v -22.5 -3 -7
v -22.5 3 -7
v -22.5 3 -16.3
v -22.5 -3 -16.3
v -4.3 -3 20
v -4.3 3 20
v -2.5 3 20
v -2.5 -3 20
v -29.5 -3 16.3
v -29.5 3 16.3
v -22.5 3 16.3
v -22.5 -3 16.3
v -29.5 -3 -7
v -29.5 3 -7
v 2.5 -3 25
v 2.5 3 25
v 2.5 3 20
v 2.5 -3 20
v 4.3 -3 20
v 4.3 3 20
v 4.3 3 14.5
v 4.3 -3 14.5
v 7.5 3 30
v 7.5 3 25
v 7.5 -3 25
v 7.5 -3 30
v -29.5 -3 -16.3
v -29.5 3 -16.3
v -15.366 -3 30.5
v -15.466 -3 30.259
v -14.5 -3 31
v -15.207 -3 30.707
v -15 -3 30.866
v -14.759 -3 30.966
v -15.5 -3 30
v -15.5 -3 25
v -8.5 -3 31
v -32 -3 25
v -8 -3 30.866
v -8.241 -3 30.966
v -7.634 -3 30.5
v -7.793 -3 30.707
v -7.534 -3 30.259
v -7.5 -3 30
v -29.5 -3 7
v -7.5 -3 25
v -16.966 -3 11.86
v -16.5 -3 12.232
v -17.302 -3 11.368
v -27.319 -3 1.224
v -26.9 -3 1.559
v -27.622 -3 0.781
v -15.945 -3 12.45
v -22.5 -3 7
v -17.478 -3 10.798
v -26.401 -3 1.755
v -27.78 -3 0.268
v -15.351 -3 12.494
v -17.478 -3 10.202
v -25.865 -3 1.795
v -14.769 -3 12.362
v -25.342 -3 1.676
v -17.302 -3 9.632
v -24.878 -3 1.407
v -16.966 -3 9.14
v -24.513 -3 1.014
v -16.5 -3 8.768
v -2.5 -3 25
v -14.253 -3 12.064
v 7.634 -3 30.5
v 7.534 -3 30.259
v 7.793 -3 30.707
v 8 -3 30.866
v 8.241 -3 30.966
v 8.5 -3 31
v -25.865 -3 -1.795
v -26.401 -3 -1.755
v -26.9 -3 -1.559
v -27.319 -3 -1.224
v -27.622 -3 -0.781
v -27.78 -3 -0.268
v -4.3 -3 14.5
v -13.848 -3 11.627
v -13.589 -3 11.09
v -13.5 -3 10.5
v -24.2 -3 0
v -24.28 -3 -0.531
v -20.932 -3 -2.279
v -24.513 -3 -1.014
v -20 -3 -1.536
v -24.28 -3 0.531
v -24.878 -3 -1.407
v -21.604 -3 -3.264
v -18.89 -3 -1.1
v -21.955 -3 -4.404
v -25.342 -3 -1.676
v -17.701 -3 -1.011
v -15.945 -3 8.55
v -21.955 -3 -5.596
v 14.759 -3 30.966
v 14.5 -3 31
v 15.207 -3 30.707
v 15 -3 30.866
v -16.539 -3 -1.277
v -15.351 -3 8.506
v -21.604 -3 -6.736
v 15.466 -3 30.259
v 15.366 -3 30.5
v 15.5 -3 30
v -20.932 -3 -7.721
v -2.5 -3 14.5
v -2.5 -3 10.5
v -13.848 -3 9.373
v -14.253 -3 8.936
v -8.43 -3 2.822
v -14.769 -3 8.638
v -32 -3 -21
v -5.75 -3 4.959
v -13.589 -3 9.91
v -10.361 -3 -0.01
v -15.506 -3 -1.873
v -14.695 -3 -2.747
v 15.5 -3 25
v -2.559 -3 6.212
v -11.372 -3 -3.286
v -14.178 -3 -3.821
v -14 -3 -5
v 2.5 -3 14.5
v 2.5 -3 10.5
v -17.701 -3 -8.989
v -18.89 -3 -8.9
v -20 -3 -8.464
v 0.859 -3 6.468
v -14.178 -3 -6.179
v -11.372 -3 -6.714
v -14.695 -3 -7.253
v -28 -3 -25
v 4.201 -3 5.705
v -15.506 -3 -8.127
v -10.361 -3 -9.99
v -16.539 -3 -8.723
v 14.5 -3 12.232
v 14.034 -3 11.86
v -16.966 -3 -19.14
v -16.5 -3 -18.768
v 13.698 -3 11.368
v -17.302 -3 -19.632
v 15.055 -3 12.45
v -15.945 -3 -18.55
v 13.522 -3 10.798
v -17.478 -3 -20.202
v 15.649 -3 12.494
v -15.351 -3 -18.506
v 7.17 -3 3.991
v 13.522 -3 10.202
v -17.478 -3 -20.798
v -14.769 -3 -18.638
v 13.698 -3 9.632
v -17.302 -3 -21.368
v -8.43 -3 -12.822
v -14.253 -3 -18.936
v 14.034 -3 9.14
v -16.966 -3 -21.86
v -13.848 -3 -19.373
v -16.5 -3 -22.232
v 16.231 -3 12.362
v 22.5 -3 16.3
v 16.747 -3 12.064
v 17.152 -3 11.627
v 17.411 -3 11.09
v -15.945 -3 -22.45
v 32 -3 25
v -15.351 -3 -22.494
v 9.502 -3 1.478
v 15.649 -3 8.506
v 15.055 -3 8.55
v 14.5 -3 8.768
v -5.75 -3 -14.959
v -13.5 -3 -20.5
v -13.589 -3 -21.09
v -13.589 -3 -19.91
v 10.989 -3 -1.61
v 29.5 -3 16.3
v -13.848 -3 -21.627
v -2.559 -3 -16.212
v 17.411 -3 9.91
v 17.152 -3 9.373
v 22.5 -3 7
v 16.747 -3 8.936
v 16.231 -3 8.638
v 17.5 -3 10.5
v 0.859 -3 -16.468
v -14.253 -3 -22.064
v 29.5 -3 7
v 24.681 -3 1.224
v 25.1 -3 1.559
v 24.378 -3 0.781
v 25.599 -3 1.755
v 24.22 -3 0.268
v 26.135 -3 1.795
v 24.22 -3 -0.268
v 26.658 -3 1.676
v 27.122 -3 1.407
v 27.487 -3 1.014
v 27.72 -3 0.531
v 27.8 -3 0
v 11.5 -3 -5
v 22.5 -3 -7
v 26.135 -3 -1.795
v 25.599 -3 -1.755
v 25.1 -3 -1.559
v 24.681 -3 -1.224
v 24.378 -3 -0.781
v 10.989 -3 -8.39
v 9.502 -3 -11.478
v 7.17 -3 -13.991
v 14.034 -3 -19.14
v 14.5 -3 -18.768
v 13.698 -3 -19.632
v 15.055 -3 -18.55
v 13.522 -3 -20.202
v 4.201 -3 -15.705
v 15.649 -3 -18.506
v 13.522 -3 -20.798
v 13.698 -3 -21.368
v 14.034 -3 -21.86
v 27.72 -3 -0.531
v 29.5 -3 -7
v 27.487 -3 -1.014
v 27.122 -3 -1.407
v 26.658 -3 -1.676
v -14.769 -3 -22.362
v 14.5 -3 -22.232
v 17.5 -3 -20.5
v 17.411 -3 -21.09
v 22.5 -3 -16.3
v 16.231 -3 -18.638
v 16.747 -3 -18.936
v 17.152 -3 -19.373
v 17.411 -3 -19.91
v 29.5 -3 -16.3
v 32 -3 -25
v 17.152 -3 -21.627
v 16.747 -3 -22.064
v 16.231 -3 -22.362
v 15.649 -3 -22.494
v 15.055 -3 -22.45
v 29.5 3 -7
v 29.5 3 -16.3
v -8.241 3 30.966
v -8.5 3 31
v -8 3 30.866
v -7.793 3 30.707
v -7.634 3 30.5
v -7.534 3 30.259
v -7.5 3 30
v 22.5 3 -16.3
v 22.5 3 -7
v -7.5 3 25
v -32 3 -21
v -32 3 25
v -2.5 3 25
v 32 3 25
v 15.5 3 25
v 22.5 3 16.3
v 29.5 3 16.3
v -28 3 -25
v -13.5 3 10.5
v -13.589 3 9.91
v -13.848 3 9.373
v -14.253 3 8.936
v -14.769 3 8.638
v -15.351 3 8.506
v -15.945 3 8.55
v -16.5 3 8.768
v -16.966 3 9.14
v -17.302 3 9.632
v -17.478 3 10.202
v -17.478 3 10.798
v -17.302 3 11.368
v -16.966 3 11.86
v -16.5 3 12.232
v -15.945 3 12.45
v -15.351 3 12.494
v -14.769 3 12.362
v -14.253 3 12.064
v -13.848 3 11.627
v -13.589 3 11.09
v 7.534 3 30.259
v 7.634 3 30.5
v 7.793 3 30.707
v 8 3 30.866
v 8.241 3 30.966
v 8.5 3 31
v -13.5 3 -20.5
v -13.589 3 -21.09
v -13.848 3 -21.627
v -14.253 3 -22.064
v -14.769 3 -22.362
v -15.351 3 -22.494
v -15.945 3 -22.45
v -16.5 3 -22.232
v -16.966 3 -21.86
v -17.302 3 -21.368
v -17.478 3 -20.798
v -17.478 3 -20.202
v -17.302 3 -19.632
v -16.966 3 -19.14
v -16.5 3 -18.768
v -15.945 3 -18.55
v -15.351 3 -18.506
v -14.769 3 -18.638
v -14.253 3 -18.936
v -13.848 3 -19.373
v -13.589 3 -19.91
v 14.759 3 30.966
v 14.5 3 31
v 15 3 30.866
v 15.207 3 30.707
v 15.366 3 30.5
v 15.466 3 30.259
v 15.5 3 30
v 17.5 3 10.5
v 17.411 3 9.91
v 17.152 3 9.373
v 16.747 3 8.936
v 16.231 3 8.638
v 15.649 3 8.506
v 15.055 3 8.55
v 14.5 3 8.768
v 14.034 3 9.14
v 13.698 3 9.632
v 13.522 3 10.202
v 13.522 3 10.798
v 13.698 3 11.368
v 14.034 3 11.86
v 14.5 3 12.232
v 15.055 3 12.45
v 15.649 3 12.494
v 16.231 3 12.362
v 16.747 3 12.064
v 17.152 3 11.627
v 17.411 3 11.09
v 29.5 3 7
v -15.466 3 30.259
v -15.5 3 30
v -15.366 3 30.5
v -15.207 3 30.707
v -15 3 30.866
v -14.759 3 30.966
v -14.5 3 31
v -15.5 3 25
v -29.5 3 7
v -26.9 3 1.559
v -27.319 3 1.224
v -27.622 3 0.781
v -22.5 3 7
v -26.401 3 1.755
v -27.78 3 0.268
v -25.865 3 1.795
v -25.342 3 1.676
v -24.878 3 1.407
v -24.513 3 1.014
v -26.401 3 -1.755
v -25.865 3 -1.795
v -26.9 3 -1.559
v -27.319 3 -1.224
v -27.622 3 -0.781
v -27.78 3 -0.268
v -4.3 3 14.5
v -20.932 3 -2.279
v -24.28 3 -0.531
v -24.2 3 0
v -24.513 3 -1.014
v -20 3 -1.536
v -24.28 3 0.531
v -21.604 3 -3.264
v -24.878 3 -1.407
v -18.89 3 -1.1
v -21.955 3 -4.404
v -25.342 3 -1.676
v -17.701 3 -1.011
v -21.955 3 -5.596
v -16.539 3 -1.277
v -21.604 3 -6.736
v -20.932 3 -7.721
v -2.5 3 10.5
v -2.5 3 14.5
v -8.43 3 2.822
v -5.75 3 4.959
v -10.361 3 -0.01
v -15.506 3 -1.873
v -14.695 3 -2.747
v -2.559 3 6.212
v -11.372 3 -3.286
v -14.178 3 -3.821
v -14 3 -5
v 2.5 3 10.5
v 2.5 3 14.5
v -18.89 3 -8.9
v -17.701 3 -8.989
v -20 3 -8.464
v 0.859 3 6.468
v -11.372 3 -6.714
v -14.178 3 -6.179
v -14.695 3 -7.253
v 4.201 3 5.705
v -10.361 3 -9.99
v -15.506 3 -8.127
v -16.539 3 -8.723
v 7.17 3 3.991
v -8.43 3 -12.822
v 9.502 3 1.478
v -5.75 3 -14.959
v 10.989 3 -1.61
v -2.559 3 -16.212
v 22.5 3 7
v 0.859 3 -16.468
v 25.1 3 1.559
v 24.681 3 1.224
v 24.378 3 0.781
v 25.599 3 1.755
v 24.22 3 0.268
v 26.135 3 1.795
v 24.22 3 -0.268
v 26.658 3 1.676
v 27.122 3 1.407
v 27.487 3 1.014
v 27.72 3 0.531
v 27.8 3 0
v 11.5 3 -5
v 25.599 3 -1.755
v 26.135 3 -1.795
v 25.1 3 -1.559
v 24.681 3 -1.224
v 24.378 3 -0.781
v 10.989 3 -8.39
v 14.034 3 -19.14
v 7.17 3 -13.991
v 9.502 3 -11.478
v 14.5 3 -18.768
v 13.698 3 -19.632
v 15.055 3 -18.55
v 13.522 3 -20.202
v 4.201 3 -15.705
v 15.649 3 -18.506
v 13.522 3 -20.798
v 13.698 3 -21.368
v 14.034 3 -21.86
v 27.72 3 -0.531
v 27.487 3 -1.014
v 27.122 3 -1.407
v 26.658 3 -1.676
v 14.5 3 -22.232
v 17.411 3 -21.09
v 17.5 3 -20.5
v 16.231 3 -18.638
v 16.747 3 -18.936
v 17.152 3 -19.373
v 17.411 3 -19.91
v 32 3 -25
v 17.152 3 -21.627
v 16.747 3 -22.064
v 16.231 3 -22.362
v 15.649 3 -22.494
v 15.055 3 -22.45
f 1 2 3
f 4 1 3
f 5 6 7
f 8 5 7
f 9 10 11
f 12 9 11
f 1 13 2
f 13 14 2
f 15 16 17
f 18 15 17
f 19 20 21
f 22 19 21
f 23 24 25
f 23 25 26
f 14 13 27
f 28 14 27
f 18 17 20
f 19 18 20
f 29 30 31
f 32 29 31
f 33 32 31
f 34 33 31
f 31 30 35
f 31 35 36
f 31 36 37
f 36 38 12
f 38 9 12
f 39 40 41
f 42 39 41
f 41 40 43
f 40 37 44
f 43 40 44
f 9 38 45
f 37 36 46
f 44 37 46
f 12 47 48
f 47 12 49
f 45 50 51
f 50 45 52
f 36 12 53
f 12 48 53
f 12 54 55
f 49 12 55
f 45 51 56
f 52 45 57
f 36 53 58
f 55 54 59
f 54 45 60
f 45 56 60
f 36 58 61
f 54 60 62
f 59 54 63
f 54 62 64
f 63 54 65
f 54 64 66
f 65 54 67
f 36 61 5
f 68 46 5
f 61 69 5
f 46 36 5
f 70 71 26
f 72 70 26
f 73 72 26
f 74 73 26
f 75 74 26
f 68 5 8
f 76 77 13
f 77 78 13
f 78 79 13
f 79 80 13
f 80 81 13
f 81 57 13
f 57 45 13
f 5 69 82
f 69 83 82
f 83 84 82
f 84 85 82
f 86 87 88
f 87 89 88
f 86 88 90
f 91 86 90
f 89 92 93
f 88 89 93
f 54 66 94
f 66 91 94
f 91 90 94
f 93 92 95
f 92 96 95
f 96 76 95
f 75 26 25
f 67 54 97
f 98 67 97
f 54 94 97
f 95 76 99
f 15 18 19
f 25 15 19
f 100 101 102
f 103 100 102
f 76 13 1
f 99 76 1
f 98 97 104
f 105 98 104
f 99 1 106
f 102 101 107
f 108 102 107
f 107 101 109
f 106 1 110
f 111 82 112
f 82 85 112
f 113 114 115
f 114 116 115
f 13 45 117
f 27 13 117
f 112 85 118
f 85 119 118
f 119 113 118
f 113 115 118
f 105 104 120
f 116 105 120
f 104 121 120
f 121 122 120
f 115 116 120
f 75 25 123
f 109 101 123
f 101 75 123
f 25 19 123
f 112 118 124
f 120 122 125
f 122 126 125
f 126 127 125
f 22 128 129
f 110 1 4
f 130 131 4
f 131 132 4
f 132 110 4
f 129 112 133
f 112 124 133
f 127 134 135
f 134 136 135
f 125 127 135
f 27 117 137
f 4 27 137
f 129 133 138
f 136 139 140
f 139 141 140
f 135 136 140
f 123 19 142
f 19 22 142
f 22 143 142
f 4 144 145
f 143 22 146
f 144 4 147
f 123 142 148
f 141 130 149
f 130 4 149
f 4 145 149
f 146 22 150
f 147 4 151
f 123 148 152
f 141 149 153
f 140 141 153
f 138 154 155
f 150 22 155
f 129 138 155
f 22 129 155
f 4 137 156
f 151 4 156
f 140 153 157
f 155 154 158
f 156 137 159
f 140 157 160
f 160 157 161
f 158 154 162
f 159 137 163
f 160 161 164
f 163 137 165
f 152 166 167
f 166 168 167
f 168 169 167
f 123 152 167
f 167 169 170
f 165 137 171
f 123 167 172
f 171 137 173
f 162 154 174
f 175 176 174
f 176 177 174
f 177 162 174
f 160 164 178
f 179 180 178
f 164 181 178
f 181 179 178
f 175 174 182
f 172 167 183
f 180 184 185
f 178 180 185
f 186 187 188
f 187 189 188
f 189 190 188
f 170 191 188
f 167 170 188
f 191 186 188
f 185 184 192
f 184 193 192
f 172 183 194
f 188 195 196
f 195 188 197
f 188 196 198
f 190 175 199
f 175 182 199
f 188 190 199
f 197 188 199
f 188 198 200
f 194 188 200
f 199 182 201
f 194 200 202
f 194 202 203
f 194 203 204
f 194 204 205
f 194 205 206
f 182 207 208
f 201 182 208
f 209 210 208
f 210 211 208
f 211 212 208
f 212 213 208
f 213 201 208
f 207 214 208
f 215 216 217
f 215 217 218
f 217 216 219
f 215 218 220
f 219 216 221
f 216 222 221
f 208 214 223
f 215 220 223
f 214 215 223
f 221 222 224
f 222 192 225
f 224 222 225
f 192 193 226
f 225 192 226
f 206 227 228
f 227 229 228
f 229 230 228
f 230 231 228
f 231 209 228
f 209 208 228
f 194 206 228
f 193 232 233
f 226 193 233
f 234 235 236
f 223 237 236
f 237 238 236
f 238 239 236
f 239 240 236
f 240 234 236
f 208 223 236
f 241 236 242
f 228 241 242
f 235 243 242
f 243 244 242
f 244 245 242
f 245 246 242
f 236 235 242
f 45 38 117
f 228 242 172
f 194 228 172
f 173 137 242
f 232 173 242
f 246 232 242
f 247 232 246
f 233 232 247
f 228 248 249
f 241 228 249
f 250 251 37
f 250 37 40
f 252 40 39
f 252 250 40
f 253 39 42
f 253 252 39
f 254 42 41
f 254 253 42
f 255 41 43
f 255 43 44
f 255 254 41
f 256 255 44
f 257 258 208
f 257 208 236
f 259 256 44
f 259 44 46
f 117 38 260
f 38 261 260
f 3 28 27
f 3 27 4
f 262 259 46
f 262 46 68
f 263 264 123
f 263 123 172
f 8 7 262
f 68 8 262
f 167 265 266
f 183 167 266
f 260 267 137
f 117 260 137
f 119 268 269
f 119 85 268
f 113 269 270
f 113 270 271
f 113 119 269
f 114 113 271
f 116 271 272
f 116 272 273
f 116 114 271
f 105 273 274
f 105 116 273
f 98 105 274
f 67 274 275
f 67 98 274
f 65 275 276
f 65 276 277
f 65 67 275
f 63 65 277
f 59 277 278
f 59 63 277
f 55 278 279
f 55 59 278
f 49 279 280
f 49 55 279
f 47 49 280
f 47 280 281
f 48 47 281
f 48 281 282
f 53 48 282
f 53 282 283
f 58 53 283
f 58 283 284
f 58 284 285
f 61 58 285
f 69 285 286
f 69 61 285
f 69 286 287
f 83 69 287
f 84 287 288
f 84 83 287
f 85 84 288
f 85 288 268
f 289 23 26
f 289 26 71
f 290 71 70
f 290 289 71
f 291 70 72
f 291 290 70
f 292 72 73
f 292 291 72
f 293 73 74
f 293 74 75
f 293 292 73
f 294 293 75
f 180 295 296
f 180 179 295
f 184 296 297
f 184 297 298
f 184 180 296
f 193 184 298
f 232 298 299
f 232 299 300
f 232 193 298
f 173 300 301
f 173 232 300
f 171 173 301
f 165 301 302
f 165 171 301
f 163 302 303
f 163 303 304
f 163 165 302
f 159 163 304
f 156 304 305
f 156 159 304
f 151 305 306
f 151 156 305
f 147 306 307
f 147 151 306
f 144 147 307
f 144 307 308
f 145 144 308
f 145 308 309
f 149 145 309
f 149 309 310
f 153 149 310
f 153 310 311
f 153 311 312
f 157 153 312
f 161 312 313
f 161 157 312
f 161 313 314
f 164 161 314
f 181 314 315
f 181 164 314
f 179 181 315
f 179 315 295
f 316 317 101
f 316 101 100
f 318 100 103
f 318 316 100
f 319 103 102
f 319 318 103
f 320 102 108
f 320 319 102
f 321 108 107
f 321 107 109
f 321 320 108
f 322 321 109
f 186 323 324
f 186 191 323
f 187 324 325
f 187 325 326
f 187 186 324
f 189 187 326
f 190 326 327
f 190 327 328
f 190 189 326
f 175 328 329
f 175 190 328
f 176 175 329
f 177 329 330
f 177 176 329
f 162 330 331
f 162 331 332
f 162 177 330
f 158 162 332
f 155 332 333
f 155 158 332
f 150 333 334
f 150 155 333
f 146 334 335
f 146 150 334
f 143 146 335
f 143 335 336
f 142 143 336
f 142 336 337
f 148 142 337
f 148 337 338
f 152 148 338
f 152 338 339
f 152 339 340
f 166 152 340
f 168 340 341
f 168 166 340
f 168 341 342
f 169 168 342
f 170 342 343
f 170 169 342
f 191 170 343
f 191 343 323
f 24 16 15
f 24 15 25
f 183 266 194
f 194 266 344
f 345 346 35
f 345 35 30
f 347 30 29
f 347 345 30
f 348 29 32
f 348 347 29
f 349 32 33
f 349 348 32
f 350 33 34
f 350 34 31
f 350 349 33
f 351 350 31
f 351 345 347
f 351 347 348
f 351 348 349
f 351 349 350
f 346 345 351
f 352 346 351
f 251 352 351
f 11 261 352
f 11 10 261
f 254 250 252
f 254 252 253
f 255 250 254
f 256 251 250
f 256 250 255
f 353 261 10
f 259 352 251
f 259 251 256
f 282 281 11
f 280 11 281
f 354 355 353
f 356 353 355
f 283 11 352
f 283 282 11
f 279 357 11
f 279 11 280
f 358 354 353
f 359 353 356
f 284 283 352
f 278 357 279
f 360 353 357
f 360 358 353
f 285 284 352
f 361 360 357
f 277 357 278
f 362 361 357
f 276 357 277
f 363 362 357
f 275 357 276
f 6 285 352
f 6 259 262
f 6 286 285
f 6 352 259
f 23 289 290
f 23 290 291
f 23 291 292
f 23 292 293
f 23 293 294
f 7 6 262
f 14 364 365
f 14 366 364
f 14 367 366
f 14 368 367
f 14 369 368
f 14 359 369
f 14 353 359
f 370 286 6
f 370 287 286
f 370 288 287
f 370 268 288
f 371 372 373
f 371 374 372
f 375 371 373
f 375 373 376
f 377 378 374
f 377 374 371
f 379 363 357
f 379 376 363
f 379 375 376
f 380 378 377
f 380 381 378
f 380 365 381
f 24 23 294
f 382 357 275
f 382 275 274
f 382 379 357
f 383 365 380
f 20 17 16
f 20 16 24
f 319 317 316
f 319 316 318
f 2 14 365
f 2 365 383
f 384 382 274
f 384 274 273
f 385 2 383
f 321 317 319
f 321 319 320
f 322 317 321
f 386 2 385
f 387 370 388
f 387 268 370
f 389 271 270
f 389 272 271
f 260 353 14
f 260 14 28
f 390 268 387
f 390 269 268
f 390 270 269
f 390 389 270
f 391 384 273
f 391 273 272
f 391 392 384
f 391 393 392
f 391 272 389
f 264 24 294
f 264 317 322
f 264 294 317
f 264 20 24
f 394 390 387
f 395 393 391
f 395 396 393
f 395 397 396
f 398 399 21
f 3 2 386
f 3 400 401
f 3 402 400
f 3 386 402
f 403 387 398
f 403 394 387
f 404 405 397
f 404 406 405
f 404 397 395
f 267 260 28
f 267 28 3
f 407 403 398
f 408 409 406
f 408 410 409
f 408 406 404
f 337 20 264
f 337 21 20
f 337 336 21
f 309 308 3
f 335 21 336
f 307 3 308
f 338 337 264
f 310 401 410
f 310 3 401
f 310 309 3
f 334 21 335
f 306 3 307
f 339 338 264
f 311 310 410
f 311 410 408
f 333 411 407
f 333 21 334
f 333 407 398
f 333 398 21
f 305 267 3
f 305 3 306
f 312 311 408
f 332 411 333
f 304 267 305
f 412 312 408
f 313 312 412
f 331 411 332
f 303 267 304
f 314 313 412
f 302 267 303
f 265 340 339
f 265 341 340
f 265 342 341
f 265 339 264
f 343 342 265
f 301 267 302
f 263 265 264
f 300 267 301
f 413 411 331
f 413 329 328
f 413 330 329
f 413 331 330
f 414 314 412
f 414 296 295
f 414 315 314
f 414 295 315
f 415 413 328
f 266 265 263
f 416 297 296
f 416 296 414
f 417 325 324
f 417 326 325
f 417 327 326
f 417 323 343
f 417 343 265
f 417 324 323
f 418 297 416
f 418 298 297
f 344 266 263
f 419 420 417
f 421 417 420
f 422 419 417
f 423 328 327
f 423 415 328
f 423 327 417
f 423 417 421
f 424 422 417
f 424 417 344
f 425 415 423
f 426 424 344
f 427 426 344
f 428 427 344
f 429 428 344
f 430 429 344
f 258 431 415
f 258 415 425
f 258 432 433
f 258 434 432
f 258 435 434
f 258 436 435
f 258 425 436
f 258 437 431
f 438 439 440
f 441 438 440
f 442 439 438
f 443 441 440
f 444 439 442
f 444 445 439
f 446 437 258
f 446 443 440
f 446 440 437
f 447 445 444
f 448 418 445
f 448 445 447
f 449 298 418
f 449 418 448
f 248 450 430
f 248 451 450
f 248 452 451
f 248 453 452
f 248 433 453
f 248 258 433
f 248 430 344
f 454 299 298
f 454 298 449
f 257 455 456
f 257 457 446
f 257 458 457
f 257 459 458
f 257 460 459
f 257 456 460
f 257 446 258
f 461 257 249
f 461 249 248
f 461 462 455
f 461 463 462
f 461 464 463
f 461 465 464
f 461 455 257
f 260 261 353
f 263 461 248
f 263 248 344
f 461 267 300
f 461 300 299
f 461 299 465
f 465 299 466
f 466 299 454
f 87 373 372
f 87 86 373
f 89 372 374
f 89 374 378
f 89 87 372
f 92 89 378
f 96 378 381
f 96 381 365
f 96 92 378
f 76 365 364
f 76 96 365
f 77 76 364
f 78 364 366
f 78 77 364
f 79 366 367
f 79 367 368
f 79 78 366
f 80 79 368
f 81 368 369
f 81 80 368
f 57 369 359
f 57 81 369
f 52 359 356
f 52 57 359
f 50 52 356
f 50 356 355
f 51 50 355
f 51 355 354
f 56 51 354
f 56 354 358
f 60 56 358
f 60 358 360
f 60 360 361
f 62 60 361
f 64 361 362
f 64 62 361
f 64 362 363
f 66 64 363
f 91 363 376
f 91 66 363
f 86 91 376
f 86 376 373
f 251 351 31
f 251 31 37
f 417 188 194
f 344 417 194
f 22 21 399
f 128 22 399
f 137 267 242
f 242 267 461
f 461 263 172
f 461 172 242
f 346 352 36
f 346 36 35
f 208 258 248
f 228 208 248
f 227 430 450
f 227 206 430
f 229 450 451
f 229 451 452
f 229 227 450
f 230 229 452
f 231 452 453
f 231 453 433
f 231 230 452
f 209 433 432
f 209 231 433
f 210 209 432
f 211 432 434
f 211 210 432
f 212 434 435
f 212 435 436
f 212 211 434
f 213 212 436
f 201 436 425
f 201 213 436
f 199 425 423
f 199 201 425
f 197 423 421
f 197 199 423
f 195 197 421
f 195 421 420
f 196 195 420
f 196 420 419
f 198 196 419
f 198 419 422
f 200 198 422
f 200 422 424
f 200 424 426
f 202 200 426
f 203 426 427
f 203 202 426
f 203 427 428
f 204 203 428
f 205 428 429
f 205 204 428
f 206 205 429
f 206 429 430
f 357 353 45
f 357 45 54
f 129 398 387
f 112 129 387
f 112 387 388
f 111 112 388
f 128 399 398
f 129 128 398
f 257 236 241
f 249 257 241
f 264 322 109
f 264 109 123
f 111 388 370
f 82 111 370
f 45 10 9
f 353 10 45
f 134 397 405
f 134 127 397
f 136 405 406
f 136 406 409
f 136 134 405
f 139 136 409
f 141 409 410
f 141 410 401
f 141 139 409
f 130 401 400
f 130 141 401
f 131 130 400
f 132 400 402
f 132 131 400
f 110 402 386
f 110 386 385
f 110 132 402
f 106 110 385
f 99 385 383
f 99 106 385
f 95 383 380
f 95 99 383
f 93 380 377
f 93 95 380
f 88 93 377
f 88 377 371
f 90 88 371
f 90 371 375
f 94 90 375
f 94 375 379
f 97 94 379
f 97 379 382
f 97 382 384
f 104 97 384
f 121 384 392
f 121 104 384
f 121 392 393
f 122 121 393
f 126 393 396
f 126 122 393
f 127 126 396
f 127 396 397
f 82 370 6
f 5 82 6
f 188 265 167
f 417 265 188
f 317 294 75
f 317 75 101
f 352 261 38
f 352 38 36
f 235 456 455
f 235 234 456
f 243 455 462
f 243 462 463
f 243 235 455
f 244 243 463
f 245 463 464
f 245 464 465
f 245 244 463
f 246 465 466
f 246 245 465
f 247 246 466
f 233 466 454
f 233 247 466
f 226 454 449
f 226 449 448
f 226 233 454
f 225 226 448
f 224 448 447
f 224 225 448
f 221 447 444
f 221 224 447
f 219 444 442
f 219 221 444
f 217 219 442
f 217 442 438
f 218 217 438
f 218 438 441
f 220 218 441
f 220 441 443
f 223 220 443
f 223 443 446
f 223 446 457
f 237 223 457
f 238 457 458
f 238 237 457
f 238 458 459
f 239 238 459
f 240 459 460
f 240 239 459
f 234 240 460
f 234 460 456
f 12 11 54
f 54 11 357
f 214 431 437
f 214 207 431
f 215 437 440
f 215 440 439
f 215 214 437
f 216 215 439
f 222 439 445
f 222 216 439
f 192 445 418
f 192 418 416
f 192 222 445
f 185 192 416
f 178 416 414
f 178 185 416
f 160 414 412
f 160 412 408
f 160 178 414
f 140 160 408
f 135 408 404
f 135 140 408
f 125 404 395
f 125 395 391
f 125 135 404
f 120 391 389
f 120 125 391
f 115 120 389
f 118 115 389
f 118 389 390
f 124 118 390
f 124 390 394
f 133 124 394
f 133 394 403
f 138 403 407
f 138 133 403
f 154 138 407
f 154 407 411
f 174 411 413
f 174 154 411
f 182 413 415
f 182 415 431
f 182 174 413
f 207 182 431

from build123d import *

# Parameters (mm, degrees)
ESQUISSE2_W             = 64
ESQUISSE2_H             = 50
ESQUISSE2_R             = 11.5
ESQUISSE2_R_2           = 4
ESQUISSE2_R_3           = 2
ESQUISSE2_R_4           = 1.8
ESQUISSE2_W_2           = 7
ESQUISSE2_H_2           = 9.3
BOSS_EXTRU_1_DEPTH      = 3
BOSS_EXTRU_2_DEPTH      = 6
ENL_V_MAT_EXTRU_1_DEPTH = 6
CHANFREIN1_SIZE         = 4


with BuildPart() as part:
    # Esquisse2 → Boss.-Extru.1 (new, symmetric)
    with BuildSketch(Plane(origin=(0, 0, 0), x_dir=(1, 0, 0), z_dir=(0, 1, 0))):
        Rectangle(ESQUISSE2_W, ESQUISSE2_H)
        with Locations((0, 5)):
            Circle(ESQUISSE2_R, mode=Mode.SUBTRACT)
        with Locations((-18, 5)):
            Circle(ESQUISSE2_R_2, mode=Mode.SUBTRACT)
        with Locations((15.5, -10.5)):
            Circle(ESQUISSE2_R_3, mode=Mode.SUBTRACT)
        with Locations((15.5, 20.5)):
            Circle(ESQUISSE2_R_3, mode=Mode.SUBTRACT)
        with Locations((-15.5, 20.5)):
            Circle(ESQUISSE2_R_3, mode=Mode.SUBTRACT)
        with Locations((-15.5, -10.5)):
            Circle(ESQUISSE2_R_3, mode=Mode.SUBTRACT)
        with Locations((26, 0)):
            Circle(ESQUISSE2_R_4, mode=Mode.SUBTRACT)
        with Locations((-26, 0)):
            Circle(ESQUISSE2_R_4, mode=Mode.SUBTRACT)
        with Locations((26, 11.65)):
            Rectangle(ESQUISSE2_W_2, ESQUISSE2_H_2, mode=Mode.SUBTRACT)
        with Locations((26, -11.65)):
            Rectangle(ESQUISSE2_W_2, ESQUISSE2_H_2, mode=Mode.SUBTRACT)
        with Locations((-26, -11.65)):
            Rectangle(ESQUISSE2_W_2, ESQUISSE2_H_2, mode=Mode.SUBTRACT)
        with Locations((-26, 11.65)):
            Rectangle(ESQUISSE2_W_2, ESQUISSE2_H_2, mode=Mode.SUBTRACT)
    extrude(amount=BOSS_EXTRU_1_DEPTH, both=True)

    # Esquisse3 → Boss.-Extru.2 (add)
    with BuildSketch(Plane(origin=(0, 3, 0), x_dir=(1, 0, 0), z_dir=(0, 1, 0))):
        with BuildLine():
            Line((-7.5, -30), (-7.5, -25))
            Line((-7.5, -25), (-15.5, -25))
            Line((-15.5, -25), (-15.5, -30))
            ThreePointArc((-15.5, -30), (-15.207106781, -30.707106781), (-14.5, -31))
            Line((-14.5, -31), (-8.5, -31))
            ThreePointArc((-8.5, -31), (-7.792893219, -30.707106781), (-7.5, -30))
        make_face()
        with BuildLine():
            Line((15.5, -30), (15.5, -25))
            Line((15.5, -25), (7.5, -25))
            Line((7.5, -25), (7.5, -30))
            ThreePointArc((7.5, -30), (7.792893219, -30.707106781), (8.5, -31))
            Line((8.5, -31), (14.5, -31))
            ThreePointArc((14.5, -31), (15.207106781, -30.707106781), (15.5, -30))
        make_face()
    extrude(amount=-BOSS_EXTRU_2_DEPTH)

    # Esquisse3<3> → Enl_v. mat.-Extru.1 (cut)
    with BuildSketch(Plane(origin=(0, 3, 0), x_dir=(1, 0, 0), z_dir=(0, 1, 0))):
        Polygon((-2.5, -25), (2.5, -25), (2.5, -20), (4.3, -20), (4.3, -14.5), (2.5, -14.5), (2.5, -10.5), (-2.5, -10.5), (-2.5, -14.5), (-4.3, -14.5), (-4.3, -20), (-2.5, -20), align=None)
    extrude(amount=-ENL_V_MAT_EXTRU_1_DEPTH, mode=Mode.SUBTRACT)

    # Chanfrein1
    chanfrein1_edges = [part.edges().sort_by_distance(p)[0] for p in [
        (-32, 0, -25),
    ]]
    chamfer(chanfrein1_edges, length=CHANFREIN1_SIZE)


solid = part.part
